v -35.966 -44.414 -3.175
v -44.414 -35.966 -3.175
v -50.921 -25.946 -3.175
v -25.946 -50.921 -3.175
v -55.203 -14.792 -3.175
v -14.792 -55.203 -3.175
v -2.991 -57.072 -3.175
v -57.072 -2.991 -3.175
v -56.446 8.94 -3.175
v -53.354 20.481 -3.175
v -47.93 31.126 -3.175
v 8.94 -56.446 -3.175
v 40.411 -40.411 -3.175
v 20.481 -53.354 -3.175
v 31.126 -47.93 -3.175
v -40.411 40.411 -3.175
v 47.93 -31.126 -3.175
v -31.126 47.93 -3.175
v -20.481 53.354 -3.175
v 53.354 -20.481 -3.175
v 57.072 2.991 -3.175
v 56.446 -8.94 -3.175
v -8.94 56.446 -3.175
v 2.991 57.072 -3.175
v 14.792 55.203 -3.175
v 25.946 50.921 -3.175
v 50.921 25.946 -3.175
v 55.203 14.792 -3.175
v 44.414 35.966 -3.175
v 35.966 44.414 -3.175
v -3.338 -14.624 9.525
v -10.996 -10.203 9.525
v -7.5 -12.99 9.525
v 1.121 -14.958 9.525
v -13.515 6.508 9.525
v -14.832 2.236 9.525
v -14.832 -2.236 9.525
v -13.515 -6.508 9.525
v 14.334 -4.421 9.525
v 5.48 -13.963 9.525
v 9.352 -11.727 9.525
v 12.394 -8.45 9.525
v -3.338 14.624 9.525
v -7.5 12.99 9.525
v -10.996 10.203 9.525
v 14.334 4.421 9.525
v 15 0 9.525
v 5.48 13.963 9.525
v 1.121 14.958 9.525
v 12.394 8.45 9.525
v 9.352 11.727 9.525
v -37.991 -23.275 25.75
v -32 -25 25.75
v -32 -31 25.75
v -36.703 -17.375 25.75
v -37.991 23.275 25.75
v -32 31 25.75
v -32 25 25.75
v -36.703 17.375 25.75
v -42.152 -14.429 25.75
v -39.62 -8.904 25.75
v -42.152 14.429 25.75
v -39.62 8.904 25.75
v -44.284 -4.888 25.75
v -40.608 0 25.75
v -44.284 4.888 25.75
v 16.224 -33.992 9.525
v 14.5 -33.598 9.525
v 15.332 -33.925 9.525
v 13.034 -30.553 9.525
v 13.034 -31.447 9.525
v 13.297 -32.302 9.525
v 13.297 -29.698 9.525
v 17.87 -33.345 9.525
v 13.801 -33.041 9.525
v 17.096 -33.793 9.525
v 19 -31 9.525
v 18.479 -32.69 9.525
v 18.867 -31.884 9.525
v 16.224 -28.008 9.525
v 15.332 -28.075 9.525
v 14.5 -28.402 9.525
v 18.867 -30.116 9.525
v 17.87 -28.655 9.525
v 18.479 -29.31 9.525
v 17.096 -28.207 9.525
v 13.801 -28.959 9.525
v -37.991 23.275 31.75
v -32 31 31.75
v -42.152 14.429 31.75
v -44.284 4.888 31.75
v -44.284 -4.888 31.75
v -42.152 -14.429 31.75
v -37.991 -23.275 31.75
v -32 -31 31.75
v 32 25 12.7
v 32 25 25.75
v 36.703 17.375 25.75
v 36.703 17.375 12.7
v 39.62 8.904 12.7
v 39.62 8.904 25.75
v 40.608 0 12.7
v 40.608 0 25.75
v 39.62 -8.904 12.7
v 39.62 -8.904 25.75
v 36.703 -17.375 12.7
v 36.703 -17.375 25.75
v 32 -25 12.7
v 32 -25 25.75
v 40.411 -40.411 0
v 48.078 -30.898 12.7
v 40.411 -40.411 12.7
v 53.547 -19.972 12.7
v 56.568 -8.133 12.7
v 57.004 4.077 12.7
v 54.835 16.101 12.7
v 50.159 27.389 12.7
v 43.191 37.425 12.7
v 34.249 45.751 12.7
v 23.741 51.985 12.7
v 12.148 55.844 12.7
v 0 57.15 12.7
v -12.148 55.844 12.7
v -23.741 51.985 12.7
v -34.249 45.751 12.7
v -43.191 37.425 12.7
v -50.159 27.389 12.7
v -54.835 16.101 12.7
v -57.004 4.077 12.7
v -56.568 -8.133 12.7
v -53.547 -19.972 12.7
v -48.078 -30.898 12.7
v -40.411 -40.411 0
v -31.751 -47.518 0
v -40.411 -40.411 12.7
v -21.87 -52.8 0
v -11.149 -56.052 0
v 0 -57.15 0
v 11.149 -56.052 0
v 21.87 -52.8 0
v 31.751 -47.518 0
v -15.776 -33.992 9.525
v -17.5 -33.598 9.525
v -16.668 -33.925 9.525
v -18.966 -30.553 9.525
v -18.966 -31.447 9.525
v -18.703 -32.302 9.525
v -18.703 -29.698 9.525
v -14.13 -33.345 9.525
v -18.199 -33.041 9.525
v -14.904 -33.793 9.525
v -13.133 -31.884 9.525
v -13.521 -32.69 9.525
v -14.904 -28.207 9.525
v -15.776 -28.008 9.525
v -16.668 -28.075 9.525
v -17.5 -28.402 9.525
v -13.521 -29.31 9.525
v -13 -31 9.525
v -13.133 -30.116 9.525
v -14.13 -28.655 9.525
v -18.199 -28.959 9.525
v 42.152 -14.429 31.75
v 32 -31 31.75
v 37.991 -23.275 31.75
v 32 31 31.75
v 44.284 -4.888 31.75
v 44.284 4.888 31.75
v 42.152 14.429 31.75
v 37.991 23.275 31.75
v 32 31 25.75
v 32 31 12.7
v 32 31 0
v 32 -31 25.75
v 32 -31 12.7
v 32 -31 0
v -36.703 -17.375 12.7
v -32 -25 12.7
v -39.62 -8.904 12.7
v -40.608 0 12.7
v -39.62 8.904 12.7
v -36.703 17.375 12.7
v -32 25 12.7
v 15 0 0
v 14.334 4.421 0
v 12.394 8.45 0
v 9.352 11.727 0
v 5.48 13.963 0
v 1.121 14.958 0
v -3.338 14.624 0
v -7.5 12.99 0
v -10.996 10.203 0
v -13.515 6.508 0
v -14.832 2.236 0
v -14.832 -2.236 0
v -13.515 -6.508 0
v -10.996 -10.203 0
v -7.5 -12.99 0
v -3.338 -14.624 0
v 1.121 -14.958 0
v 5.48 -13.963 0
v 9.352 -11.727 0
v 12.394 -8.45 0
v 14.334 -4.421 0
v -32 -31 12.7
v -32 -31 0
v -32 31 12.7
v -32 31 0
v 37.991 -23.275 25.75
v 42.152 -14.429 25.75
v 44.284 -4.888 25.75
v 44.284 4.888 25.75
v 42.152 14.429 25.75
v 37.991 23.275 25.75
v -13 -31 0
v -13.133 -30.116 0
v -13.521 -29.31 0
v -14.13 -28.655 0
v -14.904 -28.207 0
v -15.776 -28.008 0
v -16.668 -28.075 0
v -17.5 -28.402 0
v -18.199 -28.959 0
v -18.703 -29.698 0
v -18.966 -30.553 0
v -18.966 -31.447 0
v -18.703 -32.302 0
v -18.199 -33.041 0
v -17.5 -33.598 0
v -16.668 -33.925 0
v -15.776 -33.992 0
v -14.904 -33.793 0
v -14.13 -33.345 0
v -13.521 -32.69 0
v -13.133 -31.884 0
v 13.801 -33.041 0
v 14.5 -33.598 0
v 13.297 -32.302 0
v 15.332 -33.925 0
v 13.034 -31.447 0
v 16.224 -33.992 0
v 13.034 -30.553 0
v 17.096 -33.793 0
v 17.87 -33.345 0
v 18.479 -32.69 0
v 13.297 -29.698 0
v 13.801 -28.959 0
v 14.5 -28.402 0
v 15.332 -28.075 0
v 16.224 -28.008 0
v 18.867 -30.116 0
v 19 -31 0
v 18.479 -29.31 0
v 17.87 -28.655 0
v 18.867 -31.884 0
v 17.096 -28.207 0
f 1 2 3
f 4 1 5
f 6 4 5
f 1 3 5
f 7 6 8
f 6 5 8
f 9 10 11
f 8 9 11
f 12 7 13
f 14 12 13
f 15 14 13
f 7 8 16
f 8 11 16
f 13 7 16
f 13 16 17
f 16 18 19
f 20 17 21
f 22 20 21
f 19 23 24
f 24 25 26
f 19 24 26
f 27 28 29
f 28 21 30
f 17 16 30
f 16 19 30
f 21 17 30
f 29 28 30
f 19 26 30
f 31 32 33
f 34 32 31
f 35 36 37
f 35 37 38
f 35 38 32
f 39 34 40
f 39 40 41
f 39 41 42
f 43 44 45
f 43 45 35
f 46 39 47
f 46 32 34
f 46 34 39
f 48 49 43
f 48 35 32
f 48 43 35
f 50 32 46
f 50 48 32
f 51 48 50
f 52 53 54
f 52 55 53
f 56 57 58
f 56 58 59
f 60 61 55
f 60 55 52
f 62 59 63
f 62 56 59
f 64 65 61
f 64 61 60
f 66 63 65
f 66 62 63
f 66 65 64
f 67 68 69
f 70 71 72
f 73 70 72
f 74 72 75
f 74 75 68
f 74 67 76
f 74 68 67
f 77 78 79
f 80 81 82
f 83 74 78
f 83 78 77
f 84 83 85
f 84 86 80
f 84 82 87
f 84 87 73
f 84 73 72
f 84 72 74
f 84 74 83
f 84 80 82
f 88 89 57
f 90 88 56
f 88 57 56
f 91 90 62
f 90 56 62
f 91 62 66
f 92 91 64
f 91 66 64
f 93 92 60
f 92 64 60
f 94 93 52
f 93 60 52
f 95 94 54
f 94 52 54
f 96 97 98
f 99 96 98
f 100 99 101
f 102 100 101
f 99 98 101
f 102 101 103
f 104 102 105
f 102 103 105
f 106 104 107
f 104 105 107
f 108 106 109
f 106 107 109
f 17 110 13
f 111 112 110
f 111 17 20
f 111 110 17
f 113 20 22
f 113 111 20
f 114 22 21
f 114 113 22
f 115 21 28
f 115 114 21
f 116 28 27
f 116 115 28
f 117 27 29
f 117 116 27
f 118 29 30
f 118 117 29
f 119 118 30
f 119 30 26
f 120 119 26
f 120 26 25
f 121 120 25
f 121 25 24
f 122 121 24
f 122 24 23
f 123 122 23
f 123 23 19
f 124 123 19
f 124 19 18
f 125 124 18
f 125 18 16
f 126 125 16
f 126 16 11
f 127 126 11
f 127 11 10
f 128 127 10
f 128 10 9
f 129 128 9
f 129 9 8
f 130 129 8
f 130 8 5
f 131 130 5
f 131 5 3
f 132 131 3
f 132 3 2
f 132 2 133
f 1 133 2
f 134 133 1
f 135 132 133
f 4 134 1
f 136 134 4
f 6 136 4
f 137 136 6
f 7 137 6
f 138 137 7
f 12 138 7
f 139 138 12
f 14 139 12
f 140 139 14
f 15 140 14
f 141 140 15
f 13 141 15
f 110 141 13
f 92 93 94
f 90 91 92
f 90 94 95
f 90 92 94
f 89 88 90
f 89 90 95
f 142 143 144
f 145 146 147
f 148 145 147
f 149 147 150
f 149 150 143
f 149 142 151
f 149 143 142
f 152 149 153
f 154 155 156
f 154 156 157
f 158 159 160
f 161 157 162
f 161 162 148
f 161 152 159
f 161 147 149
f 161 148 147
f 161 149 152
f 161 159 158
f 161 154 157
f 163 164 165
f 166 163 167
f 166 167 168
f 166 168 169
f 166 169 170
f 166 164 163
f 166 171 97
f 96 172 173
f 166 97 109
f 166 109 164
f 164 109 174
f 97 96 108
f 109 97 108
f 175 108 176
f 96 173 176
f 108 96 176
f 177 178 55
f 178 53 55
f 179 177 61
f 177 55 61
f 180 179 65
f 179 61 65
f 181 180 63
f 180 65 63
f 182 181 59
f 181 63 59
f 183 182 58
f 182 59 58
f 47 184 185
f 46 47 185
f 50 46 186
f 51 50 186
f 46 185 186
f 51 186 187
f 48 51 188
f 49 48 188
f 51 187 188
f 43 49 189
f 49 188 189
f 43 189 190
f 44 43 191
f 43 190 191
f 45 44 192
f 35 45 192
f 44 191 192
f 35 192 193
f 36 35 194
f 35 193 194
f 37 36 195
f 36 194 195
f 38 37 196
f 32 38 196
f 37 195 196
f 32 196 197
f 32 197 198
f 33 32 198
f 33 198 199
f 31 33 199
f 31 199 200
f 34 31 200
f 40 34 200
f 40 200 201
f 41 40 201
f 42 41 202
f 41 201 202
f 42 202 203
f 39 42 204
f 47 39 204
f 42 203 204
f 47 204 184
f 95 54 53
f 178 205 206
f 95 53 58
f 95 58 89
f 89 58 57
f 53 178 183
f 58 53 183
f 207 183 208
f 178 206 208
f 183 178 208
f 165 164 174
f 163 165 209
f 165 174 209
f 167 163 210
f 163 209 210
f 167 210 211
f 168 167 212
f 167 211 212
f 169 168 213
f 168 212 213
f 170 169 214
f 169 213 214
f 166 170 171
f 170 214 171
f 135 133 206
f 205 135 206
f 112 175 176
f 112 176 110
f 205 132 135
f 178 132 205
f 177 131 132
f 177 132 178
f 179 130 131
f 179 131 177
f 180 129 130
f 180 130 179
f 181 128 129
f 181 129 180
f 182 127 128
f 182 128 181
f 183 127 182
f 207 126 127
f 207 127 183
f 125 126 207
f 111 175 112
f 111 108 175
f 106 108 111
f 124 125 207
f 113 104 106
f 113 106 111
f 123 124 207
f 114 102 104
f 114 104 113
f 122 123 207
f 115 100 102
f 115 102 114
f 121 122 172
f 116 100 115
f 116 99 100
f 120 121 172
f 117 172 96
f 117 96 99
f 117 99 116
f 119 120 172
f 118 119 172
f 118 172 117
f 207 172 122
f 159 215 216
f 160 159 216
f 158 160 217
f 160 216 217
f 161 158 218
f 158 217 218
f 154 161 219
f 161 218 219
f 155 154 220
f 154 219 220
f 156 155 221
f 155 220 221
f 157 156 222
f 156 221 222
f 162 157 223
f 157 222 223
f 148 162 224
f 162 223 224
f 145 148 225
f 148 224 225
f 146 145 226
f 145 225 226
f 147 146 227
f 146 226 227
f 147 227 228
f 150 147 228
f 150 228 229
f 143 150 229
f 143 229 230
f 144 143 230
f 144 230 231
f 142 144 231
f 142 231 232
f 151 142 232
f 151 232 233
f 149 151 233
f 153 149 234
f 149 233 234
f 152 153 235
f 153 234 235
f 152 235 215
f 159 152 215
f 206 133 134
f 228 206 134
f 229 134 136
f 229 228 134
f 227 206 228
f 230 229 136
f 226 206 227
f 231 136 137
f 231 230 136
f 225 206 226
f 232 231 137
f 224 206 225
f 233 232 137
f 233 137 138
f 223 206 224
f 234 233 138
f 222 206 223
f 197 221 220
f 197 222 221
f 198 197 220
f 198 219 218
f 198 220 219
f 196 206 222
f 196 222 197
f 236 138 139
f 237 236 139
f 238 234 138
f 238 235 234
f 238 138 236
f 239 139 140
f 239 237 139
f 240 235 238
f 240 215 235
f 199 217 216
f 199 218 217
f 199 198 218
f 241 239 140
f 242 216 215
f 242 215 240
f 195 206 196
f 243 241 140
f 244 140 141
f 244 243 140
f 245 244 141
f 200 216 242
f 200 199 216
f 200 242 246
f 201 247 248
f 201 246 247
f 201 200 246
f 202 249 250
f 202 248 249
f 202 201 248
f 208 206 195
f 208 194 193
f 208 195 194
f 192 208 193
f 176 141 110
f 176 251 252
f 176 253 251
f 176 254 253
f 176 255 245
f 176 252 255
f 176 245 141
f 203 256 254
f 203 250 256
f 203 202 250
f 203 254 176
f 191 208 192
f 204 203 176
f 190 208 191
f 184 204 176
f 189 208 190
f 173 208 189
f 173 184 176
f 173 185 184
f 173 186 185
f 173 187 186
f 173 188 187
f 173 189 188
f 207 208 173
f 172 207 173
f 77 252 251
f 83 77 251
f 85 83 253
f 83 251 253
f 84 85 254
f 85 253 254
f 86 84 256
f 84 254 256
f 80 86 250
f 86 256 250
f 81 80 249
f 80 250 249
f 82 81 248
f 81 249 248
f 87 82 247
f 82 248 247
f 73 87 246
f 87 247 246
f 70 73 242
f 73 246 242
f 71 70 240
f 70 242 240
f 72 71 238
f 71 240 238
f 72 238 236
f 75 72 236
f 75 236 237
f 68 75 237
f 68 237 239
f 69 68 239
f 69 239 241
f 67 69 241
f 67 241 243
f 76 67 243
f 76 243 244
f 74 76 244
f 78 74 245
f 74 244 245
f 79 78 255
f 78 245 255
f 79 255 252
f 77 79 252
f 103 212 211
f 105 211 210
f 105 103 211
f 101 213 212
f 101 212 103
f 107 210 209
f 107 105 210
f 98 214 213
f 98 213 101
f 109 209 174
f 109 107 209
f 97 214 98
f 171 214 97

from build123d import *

# Parameters (mm, degrees)
F2_DEPTH = 31.75
F3_DEPTH = 12.7
F1_R     = 15
F4_DEPTH = 9.525
F1_R_2   = 3
F5_DEPTH = 3.175
F6_W     = 6
F6_H     = 13.05


with BuildPart() as f2:
    # F1 (on Top) → F2 (new body)
    with BuildSketch(Plane.XY):
        with BuildLine():
            ThreePointArc((-32, 31), (-44.5533388199, 0), (-32, -31))
            Line((-32, -31), (-32, 31))
        make_face()
    extrude(amount=F2_DEPTH)



with BuildPart() as f2b:
    # F1 (on Top) → F2, piece 2 (new body)
    with BuildSketch(Plane.XY):
        with BuildLine():
            Line((32, 31), (32, -31))
            ThreePointArc((32, -31), (44.5533388199, 0), (32, 31))
        make_face()
    extrude(amount=F2_DEPTH)


with BuildPart() as f3:
    # F1 (on Top) → F3 (new body)
    with BuildSketch(Plane.XY):
        with BuildLine():
            ThreePointArc((40.4111525448, -40.4111525448), (52.799715283, -21.8703581597), (57.15, 0))
            ThreePointArc((57.15, 0), (-21.8703581597, 52.799715283), (-40.4111525448, -40.4111525448))
            Line((-40.4111525448, -40.4111525448), (-32, -31))
            ThreePointArc((-32, -31), (-44.5533388199, 0), (-32, 31))
            ThreePointArc((-32, 31), (0, 44.5533388199), (32, 31))
            ThreePointArc((32, 31), (44.5533388199, 0), (32, -31))
            Line((32, -31), (40.4111525448, -40.4111525448))
        make_face()
        with BuildLine():
            ThreePointArc((32, 31), (0, 44.5533388199), (-32, 31))
            Line((-32, 31), (32, 31))
        make_face()
    extrude(amount=F3_DEPTH)


with BuildPart() as f4:
    # F1 (on Top) → F4 (new body)
    with BuildSketch(Plane.XY):
        Circle(F1_R)
    extrude(amount=F4_DEPTH)


with BuildPart() as f4b:
    # F1 (on Top) → F4, piece 2 (new body)
    with BuildSketch(Plane.XY):
        with Locations((16, -31)):
            Circle(F1_R_2)
    extrude(amount=F4_DEPTH)


with BuildPart() as f4c:
    # F1 (on Top) → F4, piece 3 (new body)
    with BuildSketch(Plane.XY):
        with Locations((-16, -31)):
            Circle(F1_R_2)
    extrude(amount=F4_DEPTH)


with BuildPart() as f2_1:
    add(f2.part)

    add(f2b.part)  # F5 merges F2b

    add(f3.part)  # F5 merges F3

    add(f4.part)  # F5 merges F4

    add(f4b.part)  # F5 merges F4b

    add(f4c.part)  # F5 merges F4c
    # F1 (on Top) → F5 (join)
    with BuildSketch(Plane.XY):
        with BuildLine():
            Line((-32, -31), (-40.4111525448, -40.4111525448))
            ThreePointArc((-40.4111525448, -40.4111525448), (0, -57.15), (40.4111525448, -40.4111525448))
            Line((40.4111525448, -40.4111525448), (32, -31))
            Line((32, -31), (32, 31))
            Line((32, 31), (-32, 31))
            Line((-32, 31), (-32, -31))
        make_face()
        with Locations((-16, -31)):
            Circle(F1_R_2, mode=Mode.SUBTRACT)
        with Locations((16, -31)):
            Circle(F1_R_2, mode=Mode.SUBTRACT)
        Circle(F1_R, mode=Mode.SUBTRACT)
        with BuildLine():
            ThreePointArc((40.4111525448, -40.4111525448), (52.799715283, -21.8703581597), (57.15, 0))
            ThreePointArc((57.15, 0), (-21.8703581597, 52.799715283), (-40.4111525448, -40.4111525448))
            Line((-40.4111525448, -40.4111525448), (-32, -31))
            ThreePointArc((-32, -31), (-44.5533388199, 0), (-32, 31))
            ThreePointArc((-32, 31), (0, 44.5533388199), (32, 31))
            ThreePointArc((32, 31), (44.5533388199, 0), (32, -31))
            Line((32, -31), (40.4111525448, -40.4111525448))
        make_face()
        with BuildLine():
            Line((32, 31), (32, -31))
            ThreePointArc((32, -31), (44.5533388199, 0), (32, 31))
        make_face()
        with BuildLine():
            ThreePointArc((32, 31), (0, 44.5533388199), (-32, 31))
            Line((-32, 31), (32, 31))
        make_face()
        with BuildLine():
            ThreePointArc((-32, 31), (-44.5533388199, 0), (-32, -31))
            Line((-32, -31), (-32, 31))
        make_face()
        with Locations((-16, -31)):
            Circle(F1_R_2)
        with Locations((16, -31)):
            Circle(F1_R_2)
        Circle(F1_R)
    extrude(amount=-F5_DEPTH)

    # F6 (on face) → F7 (revolve, cut)
    with BuildSketch(Plane.YZ.offset(-32)):
        with Locations((-28, 19.225)):
            Rectangle(F6_W, F6_H)
    revolve(axis=Axis((0, 0, 0), (0, 0, -1)), mode=Mode.SUBTRACT)


solid = f2_1.part
